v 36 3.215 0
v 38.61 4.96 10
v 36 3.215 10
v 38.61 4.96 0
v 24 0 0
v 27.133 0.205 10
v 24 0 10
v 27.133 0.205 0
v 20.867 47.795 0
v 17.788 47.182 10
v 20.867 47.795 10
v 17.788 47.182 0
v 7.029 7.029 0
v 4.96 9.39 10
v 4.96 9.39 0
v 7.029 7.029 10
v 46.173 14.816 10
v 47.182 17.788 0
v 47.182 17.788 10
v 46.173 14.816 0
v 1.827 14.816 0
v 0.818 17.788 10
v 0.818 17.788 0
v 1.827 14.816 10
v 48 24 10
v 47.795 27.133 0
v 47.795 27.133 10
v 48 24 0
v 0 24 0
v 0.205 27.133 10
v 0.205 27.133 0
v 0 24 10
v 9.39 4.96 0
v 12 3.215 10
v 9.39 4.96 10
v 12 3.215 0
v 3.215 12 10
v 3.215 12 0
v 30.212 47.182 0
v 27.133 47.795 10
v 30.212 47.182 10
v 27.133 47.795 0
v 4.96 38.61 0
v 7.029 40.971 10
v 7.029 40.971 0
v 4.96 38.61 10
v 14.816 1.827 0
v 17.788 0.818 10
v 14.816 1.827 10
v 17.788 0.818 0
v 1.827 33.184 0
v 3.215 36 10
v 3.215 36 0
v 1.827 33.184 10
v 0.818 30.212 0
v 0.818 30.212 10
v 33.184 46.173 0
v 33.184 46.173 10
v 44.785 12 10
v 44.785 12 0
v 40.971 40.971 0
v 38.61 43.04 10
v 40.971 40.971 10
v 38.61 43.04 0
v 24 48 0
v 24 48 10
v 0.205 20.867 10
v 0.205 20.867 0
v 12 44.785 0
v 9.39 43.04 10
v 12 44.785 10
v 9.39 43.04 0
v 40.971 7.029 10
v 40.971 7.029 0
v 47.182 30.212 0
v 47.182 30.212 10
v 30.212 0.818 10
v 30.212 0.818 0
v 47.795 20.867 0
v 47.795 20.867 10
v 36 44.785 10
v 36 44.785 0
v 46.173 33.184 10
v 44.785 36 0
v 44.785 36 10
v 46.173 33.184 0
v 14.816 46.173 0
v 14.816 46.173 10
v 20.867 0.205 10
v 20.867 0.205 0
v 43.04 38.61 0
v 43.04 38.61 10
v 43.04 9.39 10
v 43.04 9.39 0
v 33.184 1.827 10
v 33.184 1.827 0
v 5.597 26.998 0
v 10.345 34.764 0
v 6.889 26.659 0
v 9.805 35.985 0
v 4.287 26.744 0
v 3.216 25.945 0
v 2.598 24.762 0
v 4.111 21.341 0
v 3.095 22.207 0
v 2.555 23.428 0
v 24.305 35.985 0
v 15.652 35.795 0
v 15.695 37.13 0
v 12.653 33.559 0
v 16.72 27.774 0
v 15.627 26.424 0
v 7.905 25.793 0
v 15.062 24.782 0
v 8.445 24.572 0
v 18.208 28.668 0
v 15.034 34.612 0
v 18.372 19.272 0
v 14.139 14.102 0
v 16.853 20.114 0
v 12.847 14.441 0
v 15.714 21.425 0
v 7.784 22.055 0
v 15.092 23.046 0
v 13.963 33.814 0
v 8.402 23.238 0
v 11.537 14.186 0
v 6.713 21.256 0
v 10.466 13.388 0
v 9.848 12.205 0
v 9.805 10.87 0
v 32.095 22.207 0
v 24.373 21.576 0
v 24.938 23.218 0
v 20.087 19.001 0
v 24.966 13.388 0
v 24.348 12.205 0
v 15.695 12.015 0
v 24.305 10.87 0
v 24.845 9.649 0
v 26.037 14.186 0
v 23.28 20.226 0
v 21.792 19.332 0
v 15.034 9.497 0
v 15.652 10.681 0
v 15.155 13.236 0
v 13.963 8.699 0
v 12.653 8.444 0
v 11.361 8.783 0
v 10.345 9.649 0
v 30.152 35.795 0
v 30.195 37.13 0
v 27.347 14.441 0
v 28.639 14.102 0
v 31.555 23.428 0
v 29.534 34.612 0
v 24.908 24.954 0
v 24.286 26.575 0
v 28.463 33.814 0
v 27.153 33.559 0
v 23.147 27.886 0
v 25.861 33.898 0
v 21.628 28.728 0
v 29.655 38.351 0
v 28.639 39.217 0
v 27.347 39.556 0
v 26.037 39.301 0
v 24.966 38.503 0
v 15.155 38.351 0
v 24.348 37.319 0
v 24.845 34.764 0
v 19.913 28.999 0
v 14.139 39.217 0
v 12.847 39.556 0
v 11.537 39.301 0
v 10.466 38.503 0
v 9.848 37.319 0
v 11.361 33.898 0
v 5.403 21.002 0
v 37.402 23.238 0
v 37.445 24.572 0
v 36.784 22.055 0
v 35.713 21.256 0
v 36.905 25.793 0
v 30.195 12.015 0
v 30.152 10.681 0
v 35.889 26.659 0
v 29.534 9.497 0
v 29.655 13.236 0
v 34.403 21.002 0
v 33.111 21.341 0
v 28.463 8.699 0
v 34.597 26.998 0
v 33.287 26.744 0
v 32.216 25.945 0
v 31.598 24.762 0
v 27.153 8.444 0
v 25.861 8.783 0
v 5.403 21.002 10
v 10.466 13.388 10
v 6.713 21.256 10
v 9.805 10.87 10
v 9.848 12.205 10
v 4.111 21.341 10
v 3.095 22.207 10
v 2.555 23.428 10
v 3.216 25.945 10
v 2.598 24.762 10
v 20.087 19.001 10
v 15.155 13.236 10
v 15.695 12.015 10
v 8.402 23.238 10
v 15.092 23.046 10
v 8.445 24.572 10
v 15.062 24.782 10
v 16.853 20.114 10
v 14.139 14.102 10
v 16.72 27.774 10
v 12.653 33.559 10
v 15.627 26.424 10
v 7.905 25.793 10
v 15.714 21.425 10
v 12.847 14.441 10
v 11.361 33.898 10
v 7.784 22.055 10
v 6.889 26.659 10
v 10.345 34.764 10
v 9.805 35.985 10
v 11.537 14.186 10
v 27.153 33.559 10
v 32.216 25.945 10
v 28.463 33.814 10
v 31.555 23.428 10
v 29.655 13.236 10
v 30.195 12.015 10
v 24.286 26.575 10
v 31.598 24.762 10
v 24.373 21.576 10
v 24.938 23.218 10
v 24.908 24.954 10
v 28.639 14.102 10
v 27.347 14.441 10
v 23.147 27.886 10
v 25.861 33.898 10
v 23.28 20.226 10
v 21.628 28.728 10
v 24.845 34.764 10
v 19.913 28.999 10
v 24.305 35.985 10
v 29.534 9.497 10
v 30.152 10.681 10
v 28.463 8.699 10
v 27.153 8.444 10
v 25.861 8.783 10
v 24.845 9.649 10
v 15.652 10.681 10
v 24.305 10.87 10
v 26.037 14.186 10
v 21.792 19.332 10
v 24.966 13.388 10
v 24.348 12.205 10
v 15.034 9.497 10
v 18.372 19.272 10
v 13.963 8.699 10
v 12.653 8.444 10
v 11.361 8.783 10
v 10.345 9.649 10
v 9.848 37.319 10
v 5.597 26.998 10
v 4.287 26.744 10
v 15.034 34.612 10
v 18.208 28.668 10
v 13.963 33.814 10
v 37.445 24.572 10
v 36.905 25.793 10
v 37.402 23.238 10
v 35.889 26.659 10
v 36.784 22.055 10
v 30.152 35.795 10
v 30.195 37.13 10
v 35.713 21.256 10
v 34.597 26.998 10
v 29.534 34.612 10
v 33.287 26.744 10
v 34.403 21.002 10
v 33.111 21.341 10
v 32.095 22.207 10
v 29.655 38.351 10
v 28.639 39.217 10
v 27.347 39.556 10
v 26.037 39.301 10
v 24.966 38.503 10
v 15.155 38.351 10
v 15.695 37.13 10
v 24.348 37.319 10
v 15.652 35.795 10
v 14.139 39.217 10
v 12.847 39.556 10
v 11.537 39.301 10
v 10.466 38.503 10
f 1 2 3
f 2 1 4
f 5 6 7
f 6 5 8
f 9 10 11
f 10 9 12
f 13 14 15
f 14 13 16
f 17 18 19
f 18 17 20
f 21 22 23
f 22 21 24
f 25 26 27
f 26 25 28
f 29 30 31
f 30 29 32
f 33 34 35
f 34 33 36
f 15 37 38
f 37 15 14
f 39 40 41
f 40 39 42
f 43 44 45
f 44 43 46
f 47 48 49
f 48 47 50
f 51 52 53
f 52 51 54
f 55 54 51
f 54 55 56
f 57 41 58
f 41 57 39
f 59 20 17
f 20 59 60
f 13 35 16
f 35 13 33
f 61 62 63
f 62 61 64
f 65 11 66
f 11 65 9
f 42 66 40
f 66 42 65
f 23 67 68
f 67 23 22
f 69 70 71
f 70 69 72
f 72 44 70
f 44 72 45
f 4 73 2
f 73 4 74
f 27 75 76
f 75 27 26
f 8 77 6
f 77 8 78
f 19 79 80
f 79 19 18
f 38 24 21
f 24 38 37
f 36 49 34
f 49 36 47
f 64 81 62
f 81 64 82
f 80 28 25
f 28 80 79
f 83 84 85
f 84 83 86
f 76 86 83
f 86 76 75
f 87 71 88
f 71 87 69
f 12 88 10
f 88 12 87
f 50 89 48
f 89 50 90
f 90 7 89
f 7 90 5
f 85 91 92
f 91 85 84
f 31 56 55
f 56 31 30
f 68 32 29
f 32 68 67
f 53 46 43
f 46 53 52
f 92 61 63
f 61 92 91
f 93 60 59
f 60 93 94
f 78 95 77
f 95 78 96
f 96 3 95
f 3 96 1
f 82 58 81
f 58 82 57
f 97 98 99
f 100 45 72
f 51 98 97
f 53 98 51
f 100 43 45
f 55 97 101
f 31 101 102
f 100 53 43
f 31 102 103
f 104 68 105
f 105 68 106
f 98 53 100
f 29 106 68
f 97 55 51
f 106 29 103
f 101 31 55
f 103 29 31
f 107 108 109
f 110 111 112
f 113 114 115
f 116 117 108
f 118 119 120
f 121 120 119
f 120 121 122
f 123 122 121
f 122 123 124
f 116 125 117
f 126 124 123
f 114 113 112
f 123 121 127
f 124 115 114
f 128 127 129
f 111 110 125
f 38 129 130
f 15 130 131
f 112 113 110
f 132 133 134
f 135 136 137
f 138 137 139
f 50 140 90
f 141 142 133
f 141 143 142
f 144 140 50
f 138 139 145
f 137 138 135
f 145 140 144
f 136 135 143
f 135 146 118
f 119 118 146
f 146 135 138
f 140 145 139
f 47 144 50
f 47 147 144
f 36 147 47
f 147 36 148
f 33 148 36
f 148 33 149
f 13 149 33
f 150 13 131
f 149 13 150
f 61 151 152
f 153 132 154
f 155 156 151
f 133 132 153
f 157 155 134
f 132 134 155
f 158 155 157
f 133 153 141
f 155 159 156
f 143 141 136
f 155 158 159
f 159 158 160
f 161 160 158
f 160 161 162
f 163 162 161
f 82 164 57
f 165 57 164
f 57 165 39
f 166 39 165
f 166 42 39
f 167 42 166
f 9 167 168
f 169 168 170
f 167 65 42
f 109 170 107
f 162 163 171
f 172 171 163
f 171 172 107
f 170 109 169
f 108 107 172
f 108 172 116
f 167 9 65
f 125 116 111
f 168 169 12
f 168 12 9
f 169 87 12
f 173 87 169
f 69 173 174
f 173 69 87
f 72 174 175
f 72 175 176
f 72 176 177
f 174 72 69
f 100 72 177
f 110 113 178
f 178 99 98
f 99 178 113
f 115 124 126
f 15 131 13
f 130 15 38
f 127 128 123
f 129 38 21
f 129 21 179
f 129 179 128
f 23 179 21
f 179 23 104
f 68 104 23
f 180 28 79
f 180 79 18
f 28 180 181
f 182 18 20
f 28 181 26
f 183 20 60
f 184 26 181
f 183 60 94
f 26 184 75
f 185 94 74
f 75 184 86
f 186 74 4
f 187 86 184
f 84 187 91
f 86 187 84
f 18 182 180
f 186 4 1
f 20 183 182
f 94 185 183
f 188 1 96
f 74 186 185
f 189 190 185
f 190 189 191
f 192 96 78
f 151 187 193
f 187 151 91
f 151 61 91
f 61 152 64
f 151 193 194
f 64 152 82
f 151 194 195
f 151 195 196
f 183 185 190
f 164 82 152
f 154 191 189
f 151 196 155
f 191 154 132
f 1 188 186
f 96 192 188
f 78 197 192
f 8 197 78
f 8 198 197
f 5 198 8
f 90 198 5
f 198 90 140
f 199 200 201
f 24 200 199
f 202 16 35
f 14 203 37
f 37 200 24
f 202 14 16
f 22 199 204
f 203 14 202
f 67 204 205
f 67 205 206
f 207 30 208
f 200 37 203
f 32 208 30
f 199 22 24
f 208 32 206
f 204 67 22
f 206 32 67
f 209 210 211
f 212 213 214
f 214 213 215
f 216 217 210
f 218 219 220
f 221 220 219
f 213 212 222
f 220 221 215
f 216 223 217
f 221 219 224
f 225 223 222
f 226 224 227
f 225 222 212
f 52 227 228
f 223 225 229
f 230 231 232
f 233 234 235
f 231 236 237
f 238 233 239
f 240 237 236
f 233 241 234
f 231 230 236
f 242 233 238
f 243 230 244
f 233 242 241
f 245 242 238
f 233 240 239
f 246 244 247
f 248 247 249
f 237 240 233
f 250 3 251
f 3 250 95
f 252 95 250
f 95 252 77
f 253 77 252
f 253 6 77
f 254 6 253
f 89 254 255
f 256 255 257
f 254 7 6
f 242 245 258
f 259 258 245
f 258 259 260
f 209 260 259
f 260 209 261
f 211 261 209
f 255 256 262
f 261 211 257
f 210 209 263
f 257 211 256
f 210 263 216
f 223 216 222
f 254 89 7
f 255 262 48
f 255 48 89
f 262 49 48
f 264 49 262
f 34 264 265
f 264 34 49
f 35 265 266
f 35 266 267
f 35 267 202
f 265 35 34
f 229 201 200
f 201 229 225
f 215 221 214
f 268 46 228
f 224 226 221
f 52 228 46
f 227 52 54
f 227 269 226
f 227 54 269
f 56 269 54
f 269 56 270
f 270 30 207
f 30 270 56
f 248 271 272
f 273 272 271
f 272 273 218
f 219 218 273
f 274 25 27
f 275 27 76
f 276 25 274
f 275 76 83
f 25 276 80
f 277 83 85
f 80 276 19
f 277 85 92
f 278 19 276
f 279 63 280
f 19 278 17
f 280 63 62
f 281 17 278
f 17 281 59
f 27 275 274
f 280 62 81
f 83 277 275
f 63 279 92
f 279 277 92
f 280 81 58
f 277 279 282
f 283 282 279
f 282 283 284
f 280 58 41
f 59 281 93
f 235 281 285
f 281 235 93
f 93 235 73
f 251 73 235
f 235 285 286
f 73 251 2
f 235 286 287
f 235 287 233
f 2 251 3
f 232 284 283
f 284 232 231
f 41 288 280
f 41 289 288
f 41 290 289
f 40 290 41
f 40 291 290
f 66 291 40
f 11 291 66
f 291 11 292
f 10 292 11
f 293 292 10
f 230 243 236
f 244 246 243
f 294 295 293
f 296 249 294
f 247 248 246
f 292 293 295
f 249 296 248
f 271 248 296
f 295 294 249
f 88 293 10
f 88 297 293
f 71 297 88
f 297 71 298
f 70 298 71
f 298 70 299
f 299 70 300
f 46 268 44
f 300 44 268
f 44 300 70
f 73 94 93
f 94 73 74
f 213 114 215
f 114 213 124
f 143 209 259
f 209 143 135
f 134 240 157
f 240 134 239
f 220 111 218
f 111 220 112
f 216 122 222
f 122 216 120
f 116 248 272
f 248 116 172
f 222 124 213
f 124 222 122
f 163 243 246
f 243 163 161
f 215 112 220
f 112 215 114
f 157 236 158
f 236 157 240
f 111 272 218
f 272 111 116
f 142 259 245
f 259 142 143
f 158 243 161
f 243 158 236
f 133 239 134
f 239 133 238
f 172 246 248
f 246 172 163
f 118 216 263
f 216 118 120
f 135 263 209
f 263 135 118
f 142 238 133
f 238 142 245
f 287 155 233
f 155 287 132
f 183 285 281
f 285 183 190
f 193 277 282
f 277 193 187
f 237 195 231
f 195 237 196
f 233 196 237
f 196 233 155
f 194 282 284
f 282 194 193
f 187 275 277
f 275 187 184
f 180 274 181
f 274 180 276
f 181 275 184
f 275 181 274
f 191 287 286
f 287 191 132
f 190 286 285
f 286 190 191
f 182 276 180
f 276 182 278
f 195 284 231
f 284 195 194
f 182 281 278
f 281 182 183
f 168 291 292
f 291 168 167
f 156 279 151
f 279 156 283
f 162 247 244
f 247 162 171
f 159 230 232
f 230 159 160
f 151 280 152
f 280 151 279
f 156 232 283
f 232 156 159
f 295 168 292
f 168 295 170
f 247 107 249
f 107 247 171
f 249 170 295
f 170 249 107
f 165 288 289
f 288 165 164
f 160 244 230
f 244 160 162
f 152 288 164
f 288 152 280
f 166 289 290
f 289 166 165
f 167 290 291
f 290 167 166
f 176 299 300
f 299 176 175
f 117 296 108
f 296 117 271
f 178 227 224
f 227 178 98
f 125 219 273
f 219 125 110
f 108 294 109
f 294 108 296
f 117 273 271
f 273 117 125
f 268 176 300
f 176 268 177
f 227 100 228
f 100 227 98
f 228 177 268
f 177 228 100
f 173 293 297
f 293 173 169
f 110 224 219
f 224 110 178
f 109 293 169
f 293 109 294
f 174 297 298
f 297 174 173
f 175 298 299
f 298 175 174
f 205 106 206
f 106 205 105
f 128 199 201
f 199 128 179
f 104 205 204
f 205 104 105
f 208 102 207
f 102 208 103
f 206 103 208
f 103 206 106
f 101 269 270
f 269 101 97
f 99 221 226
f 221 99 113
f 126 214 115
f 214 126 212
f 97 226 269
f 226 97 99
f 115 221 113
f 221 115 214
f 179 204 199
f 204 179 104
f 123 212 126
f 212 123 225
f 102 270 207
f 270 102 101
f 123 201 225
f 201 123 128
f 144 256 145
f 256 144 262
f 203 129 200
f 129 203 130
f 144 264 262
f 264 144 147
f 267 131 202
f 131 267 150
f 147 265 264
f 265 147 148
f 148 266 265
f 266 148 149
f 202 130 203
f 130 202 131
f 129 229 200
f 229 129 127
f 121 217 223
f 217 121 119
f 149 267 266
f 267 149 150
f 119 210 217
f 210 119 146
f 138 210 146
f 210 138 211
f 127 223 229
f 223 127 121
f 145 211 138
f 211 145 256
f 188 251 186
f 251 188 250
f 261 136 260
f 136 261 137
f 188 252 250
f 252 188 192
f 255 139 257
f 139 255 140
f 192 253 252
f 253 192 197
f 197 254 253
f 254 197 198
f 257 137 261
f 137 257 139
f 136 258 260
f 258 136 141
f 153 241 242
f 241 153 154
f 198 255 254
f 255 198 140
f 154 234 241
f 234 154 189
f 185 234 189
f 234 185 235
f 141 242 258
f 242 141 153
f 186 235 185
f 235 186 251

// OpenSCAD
$fn = 32;

// ----------------------------------------------------------------------
// Cam plate: eccentric cam, base R24
// ----------------------------------------------------------------------

// --- parameters (mm) ---
base_r = 24;              // base circle radius
lobe_h = 8;               // cam lobe rise
bore_r = 5;               // shaft bore radius
plate_t = 10;             // plate thickness, Z (extrusion height)
ecc = 4;                  // disc eccentricity
ring_r = 14.5;            // lightening ring radius
bolt_r = 3;               // lightening hole radius

profile = [[48, 24], [47.795, 27.133], [47.182, 30.212], [46.173, 33.184], [44.785, 36], [43.04, 38.61], [40.971, 40.971], [38.61, 43.04], [36, 44.785], [33.184, 46.173], [30.212, 47.182], [27.133, 47.795], [24, 48], [20.867, 47.795], [17.788, 47.182], [14.816, 46.173], [12, 44.785], [9.39, 43.04], [7.029, 40.971], [4.96, 38.61], [3.215, 36], [1.827, 33.184], [0.818, 30.212], [0.205, 27.133], [0, 24], [0.205, 20.867], [0.818, 17.788], [1.827, 14.816], [3.215, 12], [4.96, 9.39], [7.029, 7.029], [9.39, 4.96], [12, 3.215], [14.816, 1.827], [17.788, 0.818], [20.867, 0.205], [24, 0], [27.133, 0.205], [30.212, 0.818], [33.184, 1.827], [36, 3.215], [38.61, 4.96], [40.971, 7.029], [43.04, 9.39], [44.785, 12], [46.173, 14.816], [47.182, 17.788], [47.795, 20.867]];  // primary outline, 48 points, counter clockwise
void_1 = [[24.908, 24.954], [24.286, 26.575], [23.147, 27.886], [21.628, 28.728], [19.913, 28.999], [18.208, 28.668], [16.72, 27.774], [15.627, 26.424], [15.062, 24.782], [15.092, 23.046], [15.714, 21.425], [16.853, 20.114], [18.372, 19.272], [20.087, 19.001], [21.792, 19.332], [23.28, 20.226], [24.373, 21.576], [24.938, 23.218]];  // shaft bore, 18 points
void_2 = [[37.445, 24.572], [36.905, 25.793], [35.889, 26.659], [34.597, 26.998], [33.287, 26.744], [32.216, 25.945], [31.598, 24.762], [31.555, 23.428], [32.095, 22.207], [33.111, 21.341], [34.403, 21.002], [35.713, 21.256], [36.784, 22.055], [37.402, 23.238]];  // lightening hole 1, 14 points
void_3 = [[30.195, 37.13], [29.655, 38.351], [28.639, 39.217], [27.347, 39.556], [26.037, 39.301], [24.966, 38.503], [24.348, 37.319], [24.305, 35.985], [24.845, 34.764], [25.861, 33.898], [27.153, 33.559], [28.463, 33.814], [29.534, 34.612], [30.152, 35.795]];  // lightening hole 2, 14 points
void_4 = [[15.695, 37.13], [15.155, 38.351], [14.139, 39.217], [12.847, 39.556], [11.537, 39.301], [10.466, 38.503], [9.848, 37.319], [9.805, 35.985], [10.345, 34.764], [11.361, 33.898], [12.653, 33.559], [13.963, 33.814], [15.034, 34.612], [15.652, 35.795]];  // lightening hole 3, 14 points
void_5 = [[8.445, 24.572], [7.905, 25.793], [6.889, 26.659], [5.597, 26.998], [4.287, 26.744], [3.216, 25.945], [2.598, 24.762], [2.555, 23.428], [3.095, 22.207], [4.111, 21.341], [5.403, 21.002], [6.713, 21.256], [7.784, 22.055], [8.402, 23.238]];  // lightening hole 4, 14 points
void_6 = [[15.695, 12.015], [15.155, 13.236], [14.139, 14.102], [12.847, 14.441], [11.537, 14.186], [10.466, 13.388], [9.848, 12.205], [9.805, 10.87], [10.345, 9.649], [11.361, 8.783], [12.653, 8.444], [13.963, 8.699], [15.034, 9.497], [15.652, 10.681]];  // lightening hole 5, 14 points
void_7 = [[30.195, 12.015], [29.655, 13.236], [28.639, 14.102], [27.347, 14.441], [26.037, 14.186], [24.966, 13.388], [24.348, 12.205], [24.305, 10.87], [24.845, 9.649], [25.861, 8.783], [27.153, 8.444], [28.463, 8.699], [29.534, 9.497], [30.152, 10.681]];  // lightening hole 6, 14 points

// --- the one profile operation ---
difference() {
  linear_extrude(height = plate_t) polygon(points = profile);
  translate([0, 0, -1])
    linear_extrude(height = plate_t + 2) polygon(points = void_1);
  translate([0, 0, -1])
    linear_extrude(height = plate_t + 2) polygon(points = void_2);
  translate([0, 0, -1])
    linear_extrude(height = plate_t + 2) polygon(points = void_3);
  translate([0, 0, -1])
    linear_extrude(height = plate_t + 2) polygon(points = void_4);
  translate([0, 0, -1])
    linear_extrude(height = plate_t + 2) polygon(points = void_5);
  translate([0, 0, -1])
    linear_extrude(height = plate_t + 2) polygon(points = void_6);
  translate([0, 0, -1])
    linear_extrude(height = plate_t + 2) polygon(points = void_7);
}
